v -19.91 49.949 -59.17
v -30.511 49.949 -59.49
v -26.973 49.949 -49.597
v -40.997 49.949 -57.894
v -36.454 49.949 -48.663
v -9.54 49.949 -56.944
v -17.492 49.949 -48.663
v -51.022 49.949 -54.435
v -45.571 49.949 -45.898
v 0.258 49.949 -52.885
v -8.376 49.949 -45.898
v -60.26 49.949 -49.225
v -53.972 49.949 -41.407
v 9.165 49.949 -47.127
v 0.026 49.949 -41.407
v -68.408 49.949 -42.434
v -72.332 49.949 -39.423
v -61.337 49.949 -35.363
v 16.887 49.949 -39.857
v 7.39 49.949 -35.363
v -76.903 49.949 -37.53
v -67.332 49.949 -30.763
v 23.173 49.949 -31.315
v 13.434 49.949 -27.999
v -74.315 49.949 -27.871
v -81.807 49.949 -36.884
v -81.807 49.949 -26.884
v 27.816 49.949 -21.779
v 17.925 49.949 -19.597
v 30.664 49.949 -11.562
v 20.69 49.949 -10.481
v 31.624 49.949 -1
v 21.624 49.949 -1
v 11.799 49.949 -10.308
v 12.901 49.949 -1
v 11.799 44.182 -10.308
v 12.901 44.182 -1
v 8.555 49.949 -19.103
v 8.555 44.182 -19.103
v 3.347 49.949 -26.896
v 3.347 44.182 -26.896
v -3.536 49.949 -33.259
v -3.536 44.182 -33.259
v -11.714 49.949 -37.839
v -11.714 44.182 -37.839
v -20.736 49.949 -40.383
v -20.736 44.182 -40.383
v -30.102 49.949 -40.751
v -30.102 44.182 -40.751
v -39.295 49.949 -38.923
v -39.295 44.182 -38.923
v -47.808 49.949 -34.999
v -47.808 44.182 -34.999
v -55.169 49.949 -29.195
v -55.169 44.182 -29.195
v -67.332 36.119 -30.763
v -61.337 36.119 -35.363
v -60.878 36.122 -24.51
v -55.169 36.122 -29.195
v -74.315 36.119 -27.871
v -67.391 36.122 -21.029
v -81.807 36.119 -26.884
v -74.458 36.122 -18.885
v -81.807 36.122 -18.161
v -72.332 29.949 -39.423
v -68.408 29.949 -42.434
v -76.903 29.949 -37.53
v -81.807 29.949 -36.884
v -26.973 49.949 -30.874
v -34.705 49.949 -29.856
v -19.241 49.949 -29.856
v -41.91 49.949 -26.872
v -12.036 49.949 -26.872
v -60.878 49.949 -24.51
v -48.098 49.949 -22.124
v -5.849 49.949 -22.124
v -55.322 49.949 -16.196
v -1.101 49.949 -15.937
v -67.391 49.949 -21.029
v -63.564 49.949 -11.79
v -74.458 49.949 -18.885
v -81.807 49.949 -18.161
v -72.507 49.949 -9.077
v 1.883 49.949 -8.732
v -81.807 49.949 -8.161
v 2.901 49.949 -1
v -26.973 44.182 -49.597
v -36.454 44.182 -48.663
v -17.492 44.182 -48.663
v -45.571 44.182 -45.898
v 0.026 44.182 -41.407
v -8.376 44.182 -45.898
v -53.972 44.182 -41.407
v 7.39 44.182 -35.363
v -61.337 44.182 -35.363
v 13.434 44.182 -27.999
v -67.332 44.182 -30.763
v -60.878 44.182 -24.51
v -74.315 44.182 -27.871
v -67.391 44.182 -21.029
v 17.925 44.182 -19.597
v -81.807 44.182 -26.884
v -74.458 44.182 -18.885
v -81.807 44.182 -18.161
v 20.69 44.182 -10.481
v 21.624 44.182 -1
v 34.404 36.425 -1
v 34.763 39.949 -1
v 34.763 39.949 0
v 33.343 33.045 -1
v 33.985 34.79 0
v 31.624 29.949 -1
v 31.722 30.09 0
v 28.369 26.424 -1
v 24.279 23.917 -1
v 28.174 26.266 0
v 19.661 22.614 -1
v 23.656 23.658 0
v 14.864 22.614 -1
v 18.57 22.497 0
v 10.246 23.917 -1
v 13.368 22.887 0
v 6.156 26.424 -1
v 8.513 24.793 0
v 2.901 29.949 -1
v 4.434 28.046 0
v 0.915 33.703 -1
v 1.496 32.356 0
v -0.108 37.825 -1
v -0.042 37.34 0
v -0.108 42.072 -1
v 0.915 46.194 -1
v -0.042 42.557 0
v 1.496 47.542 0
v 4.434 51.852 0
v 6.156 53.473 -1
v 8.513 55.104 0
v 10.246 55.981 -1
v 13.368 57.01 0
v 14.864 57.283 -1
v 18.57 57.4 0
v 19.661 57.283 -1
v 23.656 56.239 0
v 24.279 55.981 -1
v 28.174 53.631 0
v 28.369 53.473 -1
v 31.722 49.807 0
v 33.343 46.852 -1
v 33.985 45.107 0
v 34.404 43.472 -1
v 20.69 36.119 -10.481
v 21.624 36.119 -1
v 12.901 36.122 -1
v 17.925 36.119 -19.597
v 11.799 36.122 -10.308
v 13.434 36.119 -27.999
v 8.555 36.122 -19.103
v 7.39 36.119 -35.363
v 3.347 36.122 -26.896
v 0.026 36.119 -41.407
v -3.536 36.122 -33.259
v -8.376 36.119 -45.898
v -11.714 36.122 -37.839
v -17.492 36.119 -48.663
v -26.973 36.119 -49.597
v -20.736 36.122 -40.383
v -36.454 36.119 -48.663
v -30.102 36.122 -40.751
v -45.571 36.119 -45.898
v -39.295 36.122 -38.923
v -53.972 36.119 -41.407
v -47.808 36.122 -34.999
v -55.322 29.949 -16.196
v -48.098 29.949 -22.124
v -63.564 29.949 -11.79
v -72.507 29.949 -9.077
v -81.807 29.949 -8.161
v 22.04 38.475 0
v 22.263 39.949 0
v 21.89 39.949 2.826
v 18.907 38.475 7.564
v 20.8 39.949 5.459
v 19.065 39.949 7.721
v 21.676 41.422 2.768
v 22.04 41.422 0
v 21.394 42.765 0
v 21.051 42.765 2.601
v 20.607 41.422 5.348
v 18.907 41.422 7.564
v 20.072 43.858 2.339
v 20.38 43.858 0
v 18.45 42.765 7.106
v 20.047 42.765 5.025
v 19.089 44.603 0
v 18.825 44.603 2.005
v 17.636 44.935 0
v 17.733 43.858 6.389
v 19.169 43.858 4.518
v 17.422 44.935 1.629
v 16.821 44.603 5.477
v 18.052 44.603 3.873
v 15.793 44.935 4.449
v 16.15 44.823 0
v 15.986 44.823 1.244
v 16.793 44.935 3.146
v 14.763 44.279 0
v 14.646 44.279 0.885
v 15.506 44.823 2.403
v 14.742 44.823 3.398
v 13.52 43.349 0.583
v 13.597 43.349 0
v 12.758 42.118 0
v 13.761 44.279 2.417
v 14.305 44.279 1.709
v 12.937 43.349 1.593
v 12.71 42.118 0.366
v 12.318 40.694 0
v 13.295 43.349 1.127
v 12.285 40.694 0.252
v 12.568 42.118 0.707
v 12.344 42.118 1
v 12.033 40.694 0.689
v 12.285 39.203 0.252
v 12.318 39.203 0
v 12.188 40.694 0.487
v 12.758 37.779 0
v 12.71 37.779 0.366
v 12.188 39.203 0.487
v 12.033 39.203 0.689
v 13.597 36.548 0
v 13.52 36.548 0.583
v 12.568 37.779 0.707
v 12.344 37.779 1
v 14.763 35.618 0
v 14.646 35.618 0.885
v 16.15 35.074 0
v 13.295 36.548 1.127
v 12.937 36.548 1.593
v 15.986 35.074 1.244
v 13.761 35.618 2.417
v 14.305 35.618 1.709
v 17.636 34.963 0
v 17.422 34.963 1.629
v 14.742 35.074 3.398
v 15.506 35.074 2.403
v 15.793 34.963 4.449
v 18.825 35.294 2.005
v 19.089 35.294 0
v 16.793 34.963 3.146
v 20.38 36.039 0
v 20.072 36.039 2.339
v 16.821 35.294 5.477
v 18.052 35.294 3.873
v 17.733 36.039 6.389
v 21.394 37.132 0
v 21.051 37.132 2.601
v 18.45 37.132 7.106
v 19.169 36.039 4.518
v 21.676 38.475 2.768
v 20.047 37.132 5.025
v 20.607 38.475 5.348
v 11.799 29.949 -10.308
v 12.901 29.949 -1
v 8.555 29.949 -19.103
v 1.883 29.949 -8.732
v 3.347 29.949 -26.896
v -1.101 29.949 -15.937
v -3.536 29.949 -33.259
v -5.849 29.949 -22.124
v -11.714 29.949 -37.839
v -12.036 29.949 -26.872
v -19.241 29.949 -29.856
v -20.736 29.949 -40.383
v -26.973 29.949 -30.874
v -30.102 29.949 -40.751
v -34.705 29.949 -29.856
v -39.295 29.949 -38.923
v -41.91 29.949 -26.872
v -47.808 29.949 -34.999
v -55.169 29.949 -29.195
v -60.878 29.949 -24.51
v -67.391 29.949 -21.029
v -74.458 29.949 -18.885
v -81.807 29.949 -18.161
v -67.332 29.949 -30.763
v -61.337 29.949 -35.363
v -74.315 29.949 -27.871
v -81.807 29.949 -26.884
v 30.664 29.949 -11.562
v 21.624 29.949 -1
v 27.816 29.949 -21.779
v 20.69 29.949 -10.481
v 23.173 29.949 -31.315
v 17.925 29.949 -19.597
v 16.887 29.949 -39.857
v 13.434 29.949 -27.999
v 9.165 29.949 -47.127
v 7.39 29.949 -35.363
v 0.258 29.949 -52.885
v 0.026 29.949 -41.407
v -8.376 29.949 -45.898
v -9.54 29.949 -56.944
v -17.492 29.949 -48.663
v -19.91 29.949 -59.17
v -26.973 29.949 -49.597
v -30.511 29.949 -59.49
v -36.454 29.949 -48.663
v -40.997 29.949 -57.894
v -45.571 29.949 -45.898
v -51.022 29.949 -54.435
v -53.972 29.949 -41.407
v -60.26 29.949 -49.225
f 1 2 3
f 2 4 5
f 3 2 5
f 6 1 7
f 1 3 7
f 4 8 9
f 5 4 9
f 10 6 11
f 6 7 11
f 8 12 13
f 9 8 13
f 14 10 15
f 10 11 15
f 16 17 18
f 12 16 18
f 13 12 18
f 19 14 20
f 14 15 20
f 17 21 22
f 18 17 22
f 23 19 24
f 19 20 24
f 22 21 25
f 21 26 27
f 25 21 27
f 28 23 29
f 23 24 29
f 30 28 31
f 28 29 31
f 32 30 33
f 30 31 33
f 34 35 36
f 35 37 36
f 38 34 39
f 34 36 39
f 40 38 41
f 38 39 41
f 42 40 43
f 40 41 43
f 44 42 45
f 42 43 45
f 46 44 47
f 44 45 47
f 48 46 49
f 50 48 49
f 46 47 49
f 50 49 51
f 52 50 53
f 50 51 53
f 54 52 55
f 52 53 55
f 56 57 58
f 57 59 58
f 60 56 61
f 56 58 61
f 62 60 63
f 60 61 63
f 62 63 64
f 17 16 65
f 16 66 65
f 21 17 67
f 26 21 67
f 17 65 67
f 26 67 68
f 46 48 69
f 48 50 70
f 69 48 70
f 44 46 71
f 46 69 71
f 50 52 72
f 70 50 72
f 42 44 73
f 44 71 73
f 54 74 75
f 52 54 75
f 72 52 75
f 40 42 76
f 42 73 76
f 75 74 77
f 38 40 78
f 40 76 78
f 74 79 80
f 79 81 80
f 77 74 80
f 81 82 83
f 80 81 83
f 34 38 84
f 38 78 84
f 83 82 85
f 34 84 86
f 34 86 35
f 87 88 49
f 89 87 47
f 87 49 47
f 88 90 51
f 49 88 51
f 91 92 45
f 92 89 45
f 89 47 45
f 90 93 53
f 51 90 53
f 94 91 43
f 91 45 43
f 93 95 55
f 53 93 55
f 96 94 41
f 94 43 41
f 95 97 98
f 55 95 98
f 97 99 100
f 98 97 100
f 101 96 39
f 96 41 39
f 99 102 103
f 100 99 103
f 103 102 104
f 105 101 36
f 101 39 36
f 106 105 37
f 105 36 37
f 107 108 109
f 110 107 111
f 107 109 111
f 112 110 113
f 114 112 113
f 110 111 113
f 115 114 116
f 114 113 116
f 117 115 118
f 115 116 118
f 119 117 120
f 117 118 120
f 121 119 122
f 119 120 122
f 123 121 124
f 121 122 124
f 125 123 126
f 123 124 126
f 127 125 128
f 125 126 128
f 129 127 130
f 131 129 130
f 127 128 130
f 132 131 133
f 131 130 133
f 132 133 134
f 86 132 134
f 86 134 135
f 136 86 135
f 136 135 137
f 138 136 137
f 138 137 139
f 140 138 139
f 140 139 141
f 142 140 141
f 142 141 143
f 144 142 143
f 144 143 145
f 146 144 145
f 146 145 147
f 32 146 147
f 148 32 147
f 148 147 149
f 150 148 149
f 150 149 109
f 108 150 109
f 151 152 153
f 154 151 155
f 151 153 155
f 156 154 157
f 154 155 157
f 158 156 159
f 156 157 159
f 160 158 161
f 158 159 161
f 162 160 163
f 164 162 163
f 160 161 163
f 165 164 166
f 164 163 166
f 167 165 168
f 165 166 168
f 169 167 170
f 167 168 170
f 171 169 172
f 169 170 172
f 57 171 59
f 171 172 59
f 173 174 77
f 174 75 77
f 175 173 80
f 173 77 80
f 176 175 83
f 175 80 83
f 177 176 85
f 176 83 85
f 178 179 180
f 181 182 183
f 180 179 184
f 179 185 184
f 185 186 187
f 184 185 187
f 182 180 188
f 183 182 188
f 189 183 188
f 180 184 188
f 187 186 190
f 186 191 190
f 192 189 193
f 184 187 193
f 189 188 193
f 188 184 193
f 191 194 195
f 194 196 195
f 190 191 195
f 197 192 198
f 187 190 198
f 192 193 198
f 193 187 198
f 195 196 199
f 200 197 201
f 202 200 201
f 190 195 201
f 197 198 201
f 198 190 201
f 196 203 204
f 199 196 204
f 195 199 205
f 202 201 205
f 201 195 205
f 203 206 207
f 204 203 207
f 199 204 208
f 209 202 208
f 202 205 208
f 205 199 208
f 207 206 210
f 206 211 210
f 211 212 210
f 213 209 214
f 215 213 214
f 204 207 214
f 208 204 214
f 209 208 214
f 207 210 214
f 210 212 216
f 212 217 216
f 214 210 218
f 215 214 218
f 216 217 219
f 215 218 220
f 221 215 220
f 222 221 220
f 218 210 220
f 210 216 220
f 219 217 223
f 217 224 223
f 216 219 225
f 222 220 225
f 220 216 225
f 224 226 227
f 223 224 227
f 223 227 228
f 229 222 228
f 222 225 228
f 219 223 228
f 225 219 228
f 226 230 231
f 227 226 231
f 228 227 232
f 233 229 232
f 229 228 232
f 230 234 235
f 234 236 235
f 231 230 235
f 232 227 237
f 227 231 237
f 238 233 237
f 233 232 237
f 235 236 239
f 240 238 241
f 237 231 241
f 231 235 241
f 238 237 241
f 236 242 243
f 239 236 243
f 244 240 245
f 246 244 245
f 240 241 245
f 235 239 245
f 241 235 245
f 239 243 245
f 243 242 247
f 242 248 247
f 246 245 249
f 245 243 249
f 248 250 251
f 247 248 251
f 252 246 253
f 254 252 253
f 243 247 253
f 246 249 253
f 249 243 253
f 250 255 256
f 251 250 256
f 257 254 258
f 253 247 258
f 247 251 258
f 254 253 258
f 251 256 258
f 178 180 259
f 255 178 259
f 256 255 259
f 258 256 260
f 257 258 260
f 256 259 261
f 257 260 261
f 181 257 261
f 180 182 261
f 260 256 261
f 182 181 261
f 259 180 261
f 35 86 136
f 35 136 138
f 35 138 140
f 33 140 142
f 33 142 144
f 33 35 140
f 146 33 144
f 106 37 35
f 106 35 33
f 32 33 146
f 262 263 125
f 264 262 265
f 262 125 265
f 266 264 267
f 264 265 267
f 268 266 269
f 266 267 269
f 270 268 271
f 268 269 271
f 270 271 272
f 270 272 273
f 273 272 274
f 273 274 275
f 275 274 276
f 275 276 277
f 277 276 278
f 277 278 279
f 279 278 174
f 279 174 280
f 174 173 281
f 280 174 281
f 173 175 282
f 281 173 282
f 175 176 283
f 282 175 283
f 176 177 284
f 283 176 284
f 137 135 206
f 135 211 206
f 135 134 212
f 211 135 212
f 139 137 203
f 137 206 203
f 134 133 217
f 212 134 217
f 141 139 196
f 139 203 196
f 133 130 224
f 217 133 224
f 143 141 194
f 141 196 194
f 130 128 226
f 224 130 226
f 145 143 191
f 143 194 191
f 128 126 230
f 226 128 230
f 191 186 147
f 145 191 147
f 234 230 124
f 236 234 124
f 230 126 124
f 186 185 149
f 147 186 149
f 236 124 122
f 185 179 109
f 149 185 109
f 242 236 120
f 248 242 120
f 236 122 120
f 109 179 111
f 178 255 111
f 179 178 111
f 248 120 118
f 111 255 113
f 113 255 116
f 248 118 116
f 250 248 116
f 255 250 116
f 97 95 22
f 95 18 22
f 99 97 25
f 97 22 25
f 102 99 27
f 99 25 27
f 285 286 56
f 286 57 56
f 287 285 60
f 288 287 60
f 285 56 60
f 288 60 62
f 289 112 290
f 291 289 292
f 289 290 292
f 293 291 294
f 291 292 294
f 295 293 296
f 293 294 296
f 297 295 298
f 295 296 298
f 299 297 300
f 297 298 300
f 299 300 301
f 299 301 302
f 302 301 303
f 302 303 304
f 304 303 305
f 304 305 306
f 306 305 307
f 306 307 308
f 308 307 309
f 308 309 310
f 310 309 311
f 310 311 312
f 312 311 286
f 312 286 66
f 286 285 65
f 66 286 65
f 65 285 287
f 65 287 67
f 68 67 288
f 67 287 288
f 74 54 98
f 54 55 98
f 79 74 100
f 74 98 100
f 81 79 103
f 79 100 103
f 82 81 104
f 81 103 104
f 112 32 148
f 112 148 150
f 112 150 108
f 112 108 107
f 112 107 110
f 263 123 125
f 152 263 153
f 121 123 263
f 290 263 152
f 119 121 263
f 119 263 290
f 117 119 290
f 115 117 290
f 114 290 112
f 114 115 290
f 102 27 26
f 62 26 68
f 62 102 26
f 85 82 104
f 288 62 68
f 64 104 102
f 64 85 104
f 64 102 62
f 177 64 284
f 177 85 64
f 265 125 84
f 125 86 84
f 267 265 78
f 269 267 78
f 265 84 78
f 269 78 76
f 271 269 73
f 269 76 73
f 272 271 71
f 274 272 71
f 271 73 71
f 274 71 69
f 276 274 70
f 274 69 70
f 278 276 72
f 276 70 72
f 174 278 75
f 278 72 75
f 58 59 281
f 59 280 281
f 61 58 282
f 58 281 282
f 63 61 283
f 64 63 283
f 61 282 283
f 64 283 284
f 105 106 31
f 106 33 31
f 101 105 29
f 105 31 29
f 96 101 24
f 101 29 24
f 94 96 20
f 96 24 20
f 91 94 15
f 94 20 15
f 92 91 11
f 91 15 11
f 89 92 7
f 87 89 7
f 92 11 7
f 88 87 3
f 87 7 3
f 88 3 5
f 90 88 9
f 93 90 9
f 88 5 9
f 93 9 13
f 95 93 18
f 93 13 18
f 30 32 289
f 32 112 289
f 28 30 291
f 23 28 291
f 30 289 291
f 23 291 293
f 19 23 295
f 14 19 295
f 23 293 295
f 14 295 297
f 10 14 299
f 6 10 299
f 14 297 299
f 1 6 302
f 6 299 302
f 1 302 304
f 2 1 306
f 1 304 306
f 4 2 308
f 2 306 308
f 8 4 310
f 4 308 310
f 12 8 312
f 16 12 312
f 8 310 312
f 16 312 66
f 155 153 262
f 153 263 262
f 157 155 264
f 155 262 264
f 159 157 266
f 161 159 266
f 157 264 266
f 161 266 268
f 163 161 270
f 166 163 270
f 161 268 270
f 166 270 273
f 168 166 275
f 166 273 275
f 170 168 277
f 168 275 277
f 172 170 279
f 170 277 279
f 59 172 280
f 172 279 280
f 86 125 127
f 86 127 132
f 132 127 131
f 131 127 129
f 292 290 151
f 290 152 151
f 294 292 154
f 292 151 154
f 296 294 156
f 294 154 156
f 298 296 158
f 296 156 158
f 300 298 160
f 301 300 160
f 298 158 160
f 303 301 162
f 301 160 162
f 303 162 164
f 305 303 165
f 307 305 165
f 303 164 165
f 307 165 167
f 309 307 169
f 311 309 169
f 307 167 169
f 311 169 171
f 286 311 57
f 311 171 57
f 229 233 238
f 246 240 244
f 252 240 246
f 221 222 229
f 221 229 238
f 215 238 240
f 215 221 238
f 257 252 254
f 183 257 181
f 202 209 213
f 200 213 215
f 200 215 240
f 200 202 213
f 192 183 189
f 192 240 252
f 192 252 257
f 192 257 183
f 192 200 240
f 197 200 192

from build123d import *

# Parameters (mm, degrees)
F0_R     = 5
F1_ANGLE = 45
F2_R     = 17.5
F2_R_2   = 5
F3_DEPTH = 1
F5_ANGLE = 135
F7_ANGLE = 45


with BuildPart() as f1:
    # F0 (on Top) → F1 (revolve)
    with BuildSketch(Plane.XY):
        with Locations((17.2625295818, 39.9485491216)):
            Circle(F0_R)
    revolve(axis=Axis((11.3439466804, 38.7977138162, 0), (0, -1, 0)), revolution_arc=F1_ANGLE)

    # F2 (on face) → F3 (join)
    with BuildSketch(Plane(origin=(0, 0, 0), x_dir=(1, 0, 0), z_dir=(0, 0, -1))):
        with Locations((17.2625295818, -39.9485491216)):
            Circle(F2_R)
        with Locations((17.2625295818, -39.9485491216)):
            Circle(F2_R_2, mode=Mode.SUBTRACT)
        with Locations((17.2625295818, -39.9485491216)):
            Circle(F2_R_2)
    extrude(amount=F3_DEPTH)

    # F4 (on face) → F5 (revolve)
    with BuildSketch(Plane(origin=(0, 0, -1), x_dir=(1, 0, 0), z_dir=(0, 0, -1))):
        Polygon((12.9011229654, -29.9485491216), (2.9011229654, -29.9485491216), (2.9011229654, -49.9485491216), (12.9011229654, -49.9485491216), (12.9011229654, -44.1824280606), (21.6239361981, -44.1824280606), (21.6239361981, -49.9485491216), (31.6239361981, -49.9485491216), (31.6239361981, -29.9485491216), (21.6239361981, -29.9485491216), (21.6239361981, -36.1191299331), (12.9011229654, -36.1218505295), align=None)
    revolve(axis=Axis((-26.9732894376, 40.484293364, -1), (0, 1, 0)), revolution_arc=F5_ANGLE)

    # F6 (on face) → F7 (revolve)
    with BuildSketch(Plane(origin=(-12.9866447188, 0, 12.9866447188), x_dir=(0, -1, 0), z_dir=(-0.7071067812, 0, 0.7071067812))):
        Polygon((-36.1218505295, -59.6545150564), (-29.9485491216, -59.6545150564), (-29.9485491216, -49.6545150564), (-49.9485491216, -49.6545150564), (-49.9485491216, -59.6545150564), (-44.1824280606, -59.6545150564), (-44.1824280606, -68.3773282891), (-49.9485491216, -68.3773282891), (-49.9485491216, -78.3773282891), (-29.9485491216, -78.3773282891), (-29.9485491216, -68.3773282891), (-36.1191299331, -68.3773282891), align=None)
    revolve(axis=Axis((-81.8073011532, 42.3686988652, -55.8340117156), (0, -1, 0)), revolution_arc=F7_ANGLE)


solid = f1.part
